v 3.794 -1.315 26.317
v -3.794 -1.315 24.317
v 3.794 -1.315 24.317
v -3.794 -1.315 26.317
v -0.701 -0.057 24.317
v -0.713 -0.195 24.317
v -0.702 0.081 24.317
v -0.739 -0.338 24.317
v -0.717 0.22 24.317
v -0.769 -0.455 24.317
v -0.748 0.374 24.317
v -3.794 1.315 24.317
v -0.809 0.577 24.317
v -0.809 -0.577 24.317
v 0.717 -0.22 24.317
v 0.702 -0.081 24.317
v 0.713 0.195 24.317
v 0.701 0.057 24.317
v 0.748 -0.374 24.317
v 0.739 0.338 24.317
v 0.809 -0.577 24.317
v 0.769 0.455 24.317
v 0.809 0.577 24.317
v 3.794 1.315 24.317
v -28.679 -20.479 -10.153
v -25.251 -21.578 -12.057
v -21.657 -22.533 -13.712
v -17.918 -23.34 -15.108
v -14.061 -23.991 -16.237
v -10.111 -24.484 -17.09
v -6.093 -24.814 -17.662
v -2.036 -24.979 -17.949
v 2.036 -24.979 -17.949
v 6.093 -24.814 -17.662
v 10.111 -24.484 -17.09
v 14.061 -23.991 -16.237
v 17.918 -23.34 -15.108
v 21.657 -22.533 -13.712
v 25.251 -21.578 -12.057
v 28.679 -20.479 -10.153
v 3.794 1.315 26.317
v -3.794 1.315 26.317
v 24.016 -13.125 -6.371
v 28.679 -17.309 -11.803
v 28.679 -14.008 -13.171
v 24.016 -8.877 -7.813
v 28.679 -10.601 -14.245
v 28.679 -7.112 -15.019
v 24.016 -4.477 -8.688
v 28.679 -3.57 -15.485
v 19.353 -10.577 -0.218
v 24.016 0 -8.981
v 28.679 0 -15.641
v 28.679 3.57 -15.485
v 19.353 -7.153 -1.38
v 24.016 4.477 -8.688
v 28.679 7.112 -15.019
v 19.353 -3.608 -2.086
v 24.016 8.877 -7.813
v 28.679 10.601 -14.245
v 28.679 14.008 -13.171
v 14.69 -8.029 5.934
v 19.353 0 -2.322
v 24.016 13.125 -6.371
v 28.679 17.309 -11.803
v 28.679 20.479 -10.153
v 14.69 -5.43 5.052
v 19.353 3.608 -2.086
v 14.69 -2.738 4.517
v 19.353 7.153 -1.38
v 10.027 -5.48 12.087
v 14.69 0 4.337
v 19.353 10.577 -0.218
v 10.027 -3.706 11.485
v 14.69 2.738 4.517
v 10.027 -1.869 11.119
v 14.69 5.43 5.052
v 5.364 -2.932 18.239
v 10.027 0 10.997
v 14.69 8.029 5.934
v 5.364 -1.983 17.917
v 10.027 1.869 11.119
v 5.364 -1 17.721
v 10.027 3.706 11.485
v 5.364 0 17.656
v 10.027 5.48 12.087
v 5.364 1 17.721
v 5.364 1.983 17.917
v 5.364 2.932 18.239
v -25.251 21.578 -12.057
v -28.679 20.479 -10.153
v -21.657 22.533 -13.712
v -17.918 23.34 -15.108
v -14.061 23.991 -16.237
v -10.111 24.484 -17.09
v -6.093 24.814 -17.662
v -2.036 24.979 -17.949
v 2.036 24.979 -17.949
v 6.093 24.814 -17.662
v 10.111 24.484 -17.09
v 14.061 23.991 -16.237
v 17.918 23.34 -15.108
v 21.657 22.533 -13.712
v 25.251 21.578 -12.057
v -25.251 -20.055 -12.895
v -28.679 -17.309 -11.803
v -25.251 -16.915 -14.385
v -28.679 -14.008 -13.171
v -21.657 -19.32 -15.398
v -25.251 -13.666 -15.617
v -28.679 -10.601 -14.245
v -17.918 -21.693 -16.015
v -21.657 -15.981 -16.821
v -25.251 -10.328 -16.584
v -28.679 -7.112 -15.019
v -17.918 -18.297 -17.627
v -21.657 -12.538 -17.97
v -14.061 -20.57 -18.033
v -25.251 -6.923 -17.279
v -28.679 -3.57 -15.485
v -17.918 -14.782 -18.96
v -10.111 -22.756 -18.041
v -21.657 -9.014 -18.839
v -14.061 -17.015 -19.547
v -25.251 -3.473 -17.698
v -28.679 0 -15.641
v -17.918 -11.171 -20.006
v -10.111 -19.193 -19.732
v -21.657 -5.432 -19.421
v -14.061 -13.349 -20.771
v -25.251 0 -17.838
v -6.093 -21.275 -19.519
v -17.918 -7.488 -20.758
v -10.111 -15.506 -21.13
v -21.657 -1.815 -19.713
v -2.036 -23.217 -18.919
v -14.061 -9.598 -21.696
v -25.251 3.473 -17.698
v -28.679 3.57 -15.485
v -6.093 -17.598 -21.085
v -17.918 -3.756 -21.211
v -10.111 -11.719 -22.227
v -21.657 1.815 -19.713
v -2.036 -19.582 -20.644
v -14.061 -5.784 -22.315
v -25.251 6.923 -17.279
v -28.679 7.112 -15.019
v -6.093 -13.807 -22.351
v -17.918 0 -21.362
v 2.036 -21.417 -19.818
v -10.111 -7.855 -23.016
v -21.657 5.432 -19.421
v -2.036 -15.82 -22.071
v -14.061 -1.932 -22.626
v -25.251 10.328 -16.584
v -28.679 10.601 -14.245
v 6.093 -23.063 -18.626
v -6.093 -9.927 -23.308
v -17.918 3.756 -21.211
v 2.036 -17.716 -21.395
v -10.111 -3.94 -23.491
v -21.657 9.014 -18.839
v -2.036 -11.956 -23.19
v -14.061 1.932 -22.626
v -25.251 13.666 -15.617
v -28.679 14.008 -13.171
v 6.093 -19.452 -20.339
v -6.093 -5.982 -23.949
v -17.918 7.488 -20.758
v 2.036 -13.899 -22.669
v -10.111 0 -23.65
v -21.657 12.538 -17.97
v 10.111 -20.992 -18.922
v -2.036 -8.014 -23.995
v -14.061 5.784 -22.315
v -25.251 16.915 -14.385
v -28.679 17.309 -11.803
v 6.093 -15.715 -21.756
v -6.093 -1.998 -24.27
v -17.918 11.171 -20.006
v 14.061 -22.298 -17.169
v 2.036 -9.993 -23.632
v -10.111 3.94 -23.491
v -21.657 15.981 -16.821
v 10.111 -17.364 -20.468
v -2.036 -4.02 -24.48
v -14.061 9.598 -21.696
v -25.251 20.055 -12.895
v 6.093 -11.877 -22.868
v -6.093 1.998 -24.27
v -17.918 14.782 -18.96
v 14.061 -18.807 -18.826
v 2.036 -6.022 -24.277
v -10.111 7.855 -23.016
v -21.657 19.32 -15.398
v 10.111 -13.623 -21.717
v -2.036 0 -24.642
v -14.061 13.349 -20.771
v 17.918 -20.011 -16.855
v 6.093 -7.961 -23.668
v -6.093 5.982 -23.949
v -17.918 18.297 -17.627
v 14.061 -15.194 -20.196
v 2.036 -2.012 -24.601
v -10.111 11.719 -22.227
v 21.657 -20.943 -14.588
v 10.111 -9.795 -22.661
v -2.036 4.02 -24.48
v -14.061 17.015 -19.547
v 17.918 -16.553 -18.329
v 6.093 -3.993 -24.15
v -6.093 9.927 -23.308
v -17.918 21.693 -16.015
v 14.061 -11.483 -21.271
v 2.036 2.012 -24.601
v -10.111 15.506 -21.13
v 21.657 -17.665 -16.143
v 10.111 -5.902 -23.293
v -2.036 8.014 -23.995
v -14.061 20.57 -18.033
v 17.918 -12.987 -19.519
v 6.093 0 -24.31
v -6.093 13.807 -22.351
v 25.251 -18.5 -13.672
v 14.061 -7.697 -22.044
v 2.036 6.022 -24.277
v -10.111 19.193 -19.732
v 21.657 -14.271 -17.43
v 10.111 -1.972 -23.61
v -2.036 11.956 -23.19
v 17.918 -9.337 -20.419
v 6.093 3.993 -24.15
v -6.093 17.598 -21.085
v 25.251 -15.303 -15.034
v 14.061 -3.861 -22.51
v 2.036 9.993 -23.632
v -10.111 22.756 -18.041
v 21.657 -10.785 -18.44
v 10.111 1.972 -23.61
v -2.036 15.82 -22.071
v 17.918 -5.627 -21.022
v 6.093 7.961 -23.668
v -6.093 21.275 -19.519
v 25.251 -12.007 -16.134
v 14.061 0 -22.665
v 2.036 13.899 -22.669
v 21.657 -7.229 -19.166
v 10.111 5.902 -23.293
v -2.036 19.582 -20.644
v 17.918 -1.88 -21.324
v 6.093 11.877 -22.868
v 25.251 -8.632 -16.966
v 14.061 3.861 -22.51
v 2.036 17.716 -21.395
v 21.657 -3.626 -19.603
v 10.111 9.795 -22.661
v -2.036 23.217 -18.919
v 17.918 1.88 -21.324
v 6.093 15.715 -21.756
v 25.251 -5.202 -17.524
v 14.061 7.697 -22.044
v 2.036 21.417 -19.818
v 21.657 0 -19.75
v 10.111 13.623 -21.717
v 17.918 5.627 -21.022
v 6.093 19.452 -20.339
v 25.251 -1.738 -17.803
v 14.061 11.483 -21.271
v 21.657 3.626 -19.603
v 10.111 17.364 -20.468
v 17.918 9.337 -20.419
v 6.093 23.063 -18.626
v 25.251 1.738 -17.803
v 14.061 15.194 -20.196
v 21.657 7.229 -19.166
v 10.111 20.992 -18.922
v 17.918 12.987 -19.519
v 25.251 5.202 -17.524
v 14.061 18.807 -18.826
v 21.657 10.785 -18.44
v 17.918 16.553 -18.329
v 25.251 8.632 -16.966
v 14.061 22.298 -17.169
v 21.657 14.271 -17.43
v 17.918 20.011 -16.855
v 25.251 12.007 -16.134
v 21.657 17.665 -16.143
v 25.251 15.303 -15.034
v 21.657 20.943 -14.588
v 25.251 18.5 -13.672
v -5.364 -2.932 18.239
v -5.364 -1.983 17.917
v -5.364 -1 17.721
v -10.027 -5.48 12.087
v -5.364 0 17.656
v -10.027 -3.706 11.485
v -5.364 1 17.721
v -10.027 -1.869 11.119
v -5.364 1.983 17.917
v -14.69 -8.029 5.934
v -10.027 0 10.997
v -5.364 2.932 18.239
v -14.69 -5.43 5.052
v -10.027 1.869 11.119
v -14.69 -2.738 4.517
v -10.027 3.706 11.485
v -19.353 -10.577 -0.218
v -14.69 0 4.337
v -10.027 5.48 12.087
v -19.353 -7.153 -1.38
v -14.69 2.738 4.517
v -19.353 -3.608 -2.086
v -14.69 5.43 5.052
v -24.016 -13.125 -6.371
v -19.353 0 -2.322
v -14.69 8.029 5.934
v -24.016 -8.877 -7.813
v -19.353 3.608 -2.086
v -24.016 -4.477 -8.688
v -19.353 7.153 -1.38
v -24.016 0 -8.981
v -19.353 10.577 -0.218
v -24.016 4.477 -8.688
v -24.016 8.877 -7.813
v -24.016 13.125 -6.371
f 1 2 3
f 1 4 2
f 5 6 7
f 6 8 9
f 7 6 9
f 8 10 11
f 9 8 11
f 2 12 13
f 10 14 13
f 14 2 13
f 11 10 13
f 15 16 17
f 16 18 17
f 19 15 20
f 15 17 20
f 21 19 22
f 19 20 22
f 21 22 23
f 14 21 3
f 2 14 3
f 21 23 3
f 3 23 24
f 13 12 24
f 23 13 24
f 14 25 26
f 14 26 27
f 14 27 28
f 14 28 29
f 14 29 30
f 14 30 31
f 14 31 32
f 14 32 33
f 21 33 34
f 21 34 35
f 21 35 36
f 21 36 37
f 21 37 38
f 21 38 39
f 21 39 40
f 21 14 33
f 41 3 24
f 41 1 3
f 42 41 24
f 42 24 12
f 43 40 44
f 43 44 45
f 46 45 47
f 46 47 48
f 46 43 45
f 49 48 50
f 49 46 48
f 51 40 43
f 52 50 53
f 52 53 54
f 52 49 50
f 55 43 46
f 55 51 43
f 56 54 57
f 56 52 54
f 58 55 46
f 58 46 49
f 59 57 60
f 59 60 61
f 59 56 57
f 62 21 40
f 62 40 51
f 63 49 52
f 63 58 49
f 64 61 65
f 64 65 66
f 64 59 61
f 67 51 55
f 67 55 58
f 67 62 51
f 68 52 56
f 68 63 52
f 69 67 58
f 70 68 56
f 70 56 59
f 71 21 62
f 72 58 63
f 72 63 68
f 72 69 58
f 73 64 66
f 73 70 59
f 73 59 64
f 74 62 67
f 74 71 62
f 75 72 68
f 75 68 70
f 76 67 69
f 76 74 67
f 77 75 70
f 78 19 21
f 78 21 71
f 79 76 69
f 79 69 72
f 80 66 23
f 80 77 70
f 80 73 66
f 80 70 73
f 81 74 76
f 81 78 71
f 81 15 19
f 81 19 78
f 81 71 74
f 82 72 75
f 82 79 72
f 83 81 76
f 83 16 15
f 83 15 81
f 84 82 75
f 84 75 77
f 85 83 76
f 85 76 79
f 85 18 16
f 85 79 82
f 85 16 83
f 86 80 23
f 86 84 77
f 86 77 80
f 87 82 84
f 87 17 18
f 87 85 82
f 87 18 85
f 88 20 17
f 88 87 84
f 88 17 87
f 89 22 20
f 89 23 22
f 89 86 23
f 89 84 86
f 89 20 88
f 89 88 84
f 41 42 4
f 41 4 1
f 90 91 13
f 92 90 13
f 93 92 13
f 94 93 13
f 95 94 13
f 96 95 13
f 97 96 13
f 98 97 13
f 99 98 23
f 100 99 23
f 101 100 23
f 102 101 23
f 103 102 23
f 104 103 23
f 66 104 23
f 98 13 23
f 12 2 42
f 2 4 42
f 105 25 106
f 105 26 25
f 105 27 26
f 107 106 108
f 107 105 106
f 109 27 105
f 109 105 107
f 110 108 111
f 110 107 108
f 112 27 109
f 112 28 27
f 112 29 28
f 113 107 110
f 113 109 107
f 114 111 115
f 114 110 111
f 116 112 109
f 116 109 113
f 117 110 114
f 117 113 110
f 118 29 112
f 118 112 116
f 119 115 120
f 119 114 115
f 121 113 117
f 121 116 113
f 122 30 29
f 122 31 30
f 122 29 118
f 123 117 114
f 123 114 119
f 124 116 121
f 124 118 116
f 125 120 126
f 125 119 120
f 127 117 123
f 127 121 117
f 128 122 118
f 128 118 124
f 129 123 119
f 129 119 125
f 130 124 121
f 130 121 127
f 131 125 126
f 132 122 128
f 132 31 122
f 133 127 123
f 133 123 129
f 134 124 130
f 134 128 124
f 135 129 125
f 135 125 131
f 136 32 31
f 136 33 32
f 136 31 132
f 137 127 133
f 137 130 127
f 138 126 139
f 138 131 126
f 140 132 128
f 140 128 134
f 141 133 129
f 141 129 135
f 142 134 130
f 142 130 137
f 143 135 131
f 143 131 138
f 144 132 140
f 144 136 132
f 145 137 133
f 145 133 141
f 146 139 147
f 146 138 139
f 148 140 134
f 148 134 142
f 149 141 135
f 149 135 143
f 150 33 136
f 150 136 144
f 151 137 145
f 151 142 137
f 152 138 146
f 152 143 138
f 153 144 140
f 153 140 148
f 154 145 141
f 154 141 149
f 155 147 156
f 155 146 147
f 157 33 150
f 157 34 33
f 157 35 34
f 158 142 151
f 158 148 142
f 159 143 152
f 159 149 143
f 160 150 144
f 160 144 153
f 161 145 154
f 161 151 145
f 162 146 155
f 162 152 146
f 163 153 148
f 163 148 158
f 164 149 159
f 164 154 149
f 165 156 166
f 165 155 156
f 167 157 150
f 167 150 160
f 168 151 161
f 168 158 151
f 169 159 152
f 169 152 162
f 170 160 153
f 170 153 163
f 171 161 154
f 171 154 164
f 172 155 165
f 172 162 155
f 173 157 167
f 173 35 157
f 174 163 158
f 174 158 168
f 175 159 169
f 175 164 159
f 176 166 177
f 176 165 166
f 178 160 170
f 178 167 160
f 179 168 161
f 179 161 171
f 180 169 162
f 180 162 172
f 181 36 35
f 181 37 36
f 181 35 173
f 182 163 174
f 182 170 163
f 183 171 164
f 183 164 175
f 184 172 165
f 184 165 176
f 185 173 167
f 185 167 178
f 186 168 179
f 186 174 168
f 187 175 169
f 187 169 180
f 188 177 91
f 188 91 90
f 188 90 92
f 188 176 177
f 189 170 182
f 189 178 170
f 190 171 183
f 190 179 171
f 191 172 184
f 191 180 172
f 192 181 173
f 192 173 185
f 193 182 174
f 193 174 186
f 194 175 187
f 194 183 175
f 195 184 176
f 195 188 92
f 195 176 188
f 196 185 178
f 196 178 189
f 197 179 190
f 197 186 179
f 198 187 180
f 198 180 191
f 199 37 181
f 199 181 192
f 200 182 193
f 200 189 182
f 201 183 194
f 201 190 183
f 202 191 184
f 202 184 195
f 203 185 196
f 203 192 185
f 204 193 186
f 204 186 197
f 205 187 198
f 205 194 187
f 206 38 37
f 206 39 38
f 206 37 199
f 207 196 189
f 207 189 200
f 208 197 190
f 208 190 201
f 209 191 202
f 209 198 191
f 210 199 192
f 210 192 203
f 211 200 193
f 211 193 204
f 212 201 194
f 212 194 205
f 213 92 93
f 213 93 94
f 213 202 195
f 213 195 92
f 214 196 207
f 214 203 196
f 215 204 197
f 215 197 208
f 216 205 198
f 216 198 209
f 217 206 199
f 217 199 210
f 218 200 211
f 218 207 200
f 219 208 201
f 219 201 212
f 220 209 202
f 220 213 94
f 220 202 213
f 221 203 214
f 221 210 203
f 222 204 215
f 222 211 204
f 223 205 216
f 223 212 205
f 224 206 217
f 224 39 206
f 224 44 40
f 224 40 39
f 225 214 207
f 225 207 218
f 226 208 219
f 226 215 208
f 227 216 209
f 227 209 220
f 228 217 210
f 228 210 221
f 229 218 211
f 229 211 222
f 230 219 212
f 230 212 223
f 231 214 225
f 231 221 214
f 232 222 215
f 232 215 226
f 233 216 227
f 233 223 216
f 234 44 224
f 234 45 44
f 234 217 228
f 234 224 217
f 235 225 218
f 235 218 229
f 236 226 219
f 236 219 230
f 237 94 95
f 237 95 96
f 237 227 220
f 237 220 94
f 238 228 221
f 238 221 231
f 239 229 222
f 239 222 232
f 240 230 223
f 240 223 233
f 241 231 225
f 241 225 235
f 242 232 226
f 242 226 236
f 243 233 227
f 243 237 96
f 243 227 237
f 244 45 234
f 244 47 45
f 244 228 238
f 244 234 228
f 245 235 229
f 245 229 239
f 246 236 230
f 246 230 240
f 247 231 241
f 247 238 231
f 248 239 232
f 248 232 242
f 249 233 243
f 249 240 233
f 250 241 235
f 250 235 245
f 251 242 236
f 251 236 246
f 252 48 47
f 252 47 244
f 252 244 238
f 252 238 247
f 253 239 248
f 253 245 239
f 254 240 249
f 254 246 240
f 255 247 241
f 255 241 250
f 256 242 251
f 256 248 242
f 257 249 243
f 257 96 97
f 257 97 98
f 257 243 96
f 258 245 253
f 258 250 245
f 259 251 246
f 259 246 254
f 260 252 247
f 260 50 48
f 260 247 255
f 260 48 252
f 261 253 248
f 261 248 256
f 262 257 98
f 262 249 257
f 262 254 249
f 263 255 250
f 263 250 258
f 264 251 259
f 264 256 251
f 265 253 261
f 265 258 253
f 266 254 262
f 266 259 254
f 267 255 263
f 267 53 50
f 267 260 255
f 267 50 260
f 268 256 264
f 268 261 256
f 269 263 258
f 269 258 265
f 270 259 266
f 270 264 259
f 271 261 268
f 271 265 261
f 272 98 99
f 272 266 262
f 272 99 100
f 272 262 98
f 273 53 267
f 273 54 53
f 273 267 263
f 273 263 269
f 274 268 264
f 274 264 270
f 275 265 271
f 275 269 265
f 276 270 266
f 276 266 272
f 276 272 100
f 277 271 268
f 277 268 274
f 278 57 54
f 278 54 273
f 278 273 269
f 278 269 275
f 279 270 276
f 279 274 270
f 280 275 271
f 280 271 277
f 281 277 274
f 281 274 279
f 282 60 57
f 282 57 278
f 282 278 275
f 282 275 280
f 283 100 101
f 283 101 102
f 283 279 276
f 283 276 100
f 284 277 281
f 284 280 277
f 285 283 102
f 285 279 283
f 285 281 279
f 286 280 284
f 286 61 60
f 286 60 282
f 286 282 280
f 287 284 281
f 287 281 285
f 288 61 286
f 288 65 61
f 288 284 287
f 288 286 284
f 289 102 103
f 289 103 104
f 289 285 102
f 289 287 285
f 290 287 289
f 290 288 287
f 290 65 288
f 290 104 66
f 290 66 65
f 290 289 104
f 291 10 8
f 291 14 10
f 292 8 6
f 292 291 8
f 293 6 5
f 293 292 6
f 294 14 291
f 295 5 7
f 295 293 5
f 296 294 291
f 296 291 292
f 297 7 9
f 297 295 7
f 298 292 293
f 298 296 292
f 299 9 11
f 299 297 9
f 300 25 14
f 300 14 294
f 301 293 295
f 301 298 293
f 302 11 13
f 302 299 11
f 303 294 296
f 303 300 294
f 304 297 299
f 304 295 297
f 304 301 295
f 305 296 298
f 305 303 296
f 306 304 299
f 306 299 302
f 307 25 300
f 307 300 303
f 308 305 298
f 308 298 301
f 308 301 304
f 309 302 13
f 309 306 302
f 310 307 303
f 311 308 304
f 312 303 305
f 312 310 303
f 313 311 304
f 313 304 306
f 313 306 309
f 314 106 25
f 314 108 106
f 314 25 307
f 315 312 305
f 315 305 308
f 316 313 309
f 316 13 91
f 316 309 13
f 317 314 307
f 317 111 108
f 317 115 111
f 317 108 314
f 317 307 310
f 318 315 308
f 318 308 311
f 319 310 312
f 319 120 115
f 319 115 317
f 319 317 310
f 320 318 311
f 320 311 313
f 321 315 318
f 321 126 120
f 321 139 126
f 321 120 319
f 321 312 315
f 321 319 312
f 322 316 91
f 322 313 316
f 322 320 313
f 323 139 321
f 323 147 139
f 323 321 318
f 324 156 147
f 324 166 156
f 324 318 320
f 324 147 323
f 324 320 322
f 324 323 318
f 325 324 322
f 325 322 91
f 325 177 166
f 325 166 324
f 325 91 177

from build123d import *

# Parameters (mm, degrees)
F3_ANGLE_BACK = 30
F3_ANGLE      = 60
F2_W          = 3.7940205075
F2_H          = 2.6295655407
F4_DEPTH      = 1


with BuildPart() as f3:
    # F0 (on Front) → F3 (revolve)
    with BuildSketch(Plane.XZ, mode=Mode.PRIVATE) as f3_sk:
        with BuildLine():
            Line((28.6788218176, -15.6407412676), (0, 25.3168609469))
            Line((0, 25.3168609469), (-28.6788218176, -15.6407412676))
            ThreePointArc((-28.6788218176, -15.6407412676), (0, -24.6831390531), (28.6788218176, -15.6407412676))
        make_face()
    revolve(f3_sk.sketch.rotate(Axis((3.0188281089, 0, 25.3168609469), (1, 0, 0)), -F3_ANGLE_BACK), axis=Axis((3.0188281089, 0, 25.3168609469), (1, 0, 0)), revolution_arc=F3_ANGLE)

    # F2 (on plane+point) → F4 (join, symmetric)
    with BuildSketch(Plane.XY.offset(25.3168609469)):
        with Locations((1.8970102537, 0)):
            Rectangle(F2_W, F2_H)
        with Locations((-1.8970102537, 0)):
            Rectangle(F2_W, F2_H)
    extrude(amount=F4_DEPTH, both=True)


solid = f3.part
